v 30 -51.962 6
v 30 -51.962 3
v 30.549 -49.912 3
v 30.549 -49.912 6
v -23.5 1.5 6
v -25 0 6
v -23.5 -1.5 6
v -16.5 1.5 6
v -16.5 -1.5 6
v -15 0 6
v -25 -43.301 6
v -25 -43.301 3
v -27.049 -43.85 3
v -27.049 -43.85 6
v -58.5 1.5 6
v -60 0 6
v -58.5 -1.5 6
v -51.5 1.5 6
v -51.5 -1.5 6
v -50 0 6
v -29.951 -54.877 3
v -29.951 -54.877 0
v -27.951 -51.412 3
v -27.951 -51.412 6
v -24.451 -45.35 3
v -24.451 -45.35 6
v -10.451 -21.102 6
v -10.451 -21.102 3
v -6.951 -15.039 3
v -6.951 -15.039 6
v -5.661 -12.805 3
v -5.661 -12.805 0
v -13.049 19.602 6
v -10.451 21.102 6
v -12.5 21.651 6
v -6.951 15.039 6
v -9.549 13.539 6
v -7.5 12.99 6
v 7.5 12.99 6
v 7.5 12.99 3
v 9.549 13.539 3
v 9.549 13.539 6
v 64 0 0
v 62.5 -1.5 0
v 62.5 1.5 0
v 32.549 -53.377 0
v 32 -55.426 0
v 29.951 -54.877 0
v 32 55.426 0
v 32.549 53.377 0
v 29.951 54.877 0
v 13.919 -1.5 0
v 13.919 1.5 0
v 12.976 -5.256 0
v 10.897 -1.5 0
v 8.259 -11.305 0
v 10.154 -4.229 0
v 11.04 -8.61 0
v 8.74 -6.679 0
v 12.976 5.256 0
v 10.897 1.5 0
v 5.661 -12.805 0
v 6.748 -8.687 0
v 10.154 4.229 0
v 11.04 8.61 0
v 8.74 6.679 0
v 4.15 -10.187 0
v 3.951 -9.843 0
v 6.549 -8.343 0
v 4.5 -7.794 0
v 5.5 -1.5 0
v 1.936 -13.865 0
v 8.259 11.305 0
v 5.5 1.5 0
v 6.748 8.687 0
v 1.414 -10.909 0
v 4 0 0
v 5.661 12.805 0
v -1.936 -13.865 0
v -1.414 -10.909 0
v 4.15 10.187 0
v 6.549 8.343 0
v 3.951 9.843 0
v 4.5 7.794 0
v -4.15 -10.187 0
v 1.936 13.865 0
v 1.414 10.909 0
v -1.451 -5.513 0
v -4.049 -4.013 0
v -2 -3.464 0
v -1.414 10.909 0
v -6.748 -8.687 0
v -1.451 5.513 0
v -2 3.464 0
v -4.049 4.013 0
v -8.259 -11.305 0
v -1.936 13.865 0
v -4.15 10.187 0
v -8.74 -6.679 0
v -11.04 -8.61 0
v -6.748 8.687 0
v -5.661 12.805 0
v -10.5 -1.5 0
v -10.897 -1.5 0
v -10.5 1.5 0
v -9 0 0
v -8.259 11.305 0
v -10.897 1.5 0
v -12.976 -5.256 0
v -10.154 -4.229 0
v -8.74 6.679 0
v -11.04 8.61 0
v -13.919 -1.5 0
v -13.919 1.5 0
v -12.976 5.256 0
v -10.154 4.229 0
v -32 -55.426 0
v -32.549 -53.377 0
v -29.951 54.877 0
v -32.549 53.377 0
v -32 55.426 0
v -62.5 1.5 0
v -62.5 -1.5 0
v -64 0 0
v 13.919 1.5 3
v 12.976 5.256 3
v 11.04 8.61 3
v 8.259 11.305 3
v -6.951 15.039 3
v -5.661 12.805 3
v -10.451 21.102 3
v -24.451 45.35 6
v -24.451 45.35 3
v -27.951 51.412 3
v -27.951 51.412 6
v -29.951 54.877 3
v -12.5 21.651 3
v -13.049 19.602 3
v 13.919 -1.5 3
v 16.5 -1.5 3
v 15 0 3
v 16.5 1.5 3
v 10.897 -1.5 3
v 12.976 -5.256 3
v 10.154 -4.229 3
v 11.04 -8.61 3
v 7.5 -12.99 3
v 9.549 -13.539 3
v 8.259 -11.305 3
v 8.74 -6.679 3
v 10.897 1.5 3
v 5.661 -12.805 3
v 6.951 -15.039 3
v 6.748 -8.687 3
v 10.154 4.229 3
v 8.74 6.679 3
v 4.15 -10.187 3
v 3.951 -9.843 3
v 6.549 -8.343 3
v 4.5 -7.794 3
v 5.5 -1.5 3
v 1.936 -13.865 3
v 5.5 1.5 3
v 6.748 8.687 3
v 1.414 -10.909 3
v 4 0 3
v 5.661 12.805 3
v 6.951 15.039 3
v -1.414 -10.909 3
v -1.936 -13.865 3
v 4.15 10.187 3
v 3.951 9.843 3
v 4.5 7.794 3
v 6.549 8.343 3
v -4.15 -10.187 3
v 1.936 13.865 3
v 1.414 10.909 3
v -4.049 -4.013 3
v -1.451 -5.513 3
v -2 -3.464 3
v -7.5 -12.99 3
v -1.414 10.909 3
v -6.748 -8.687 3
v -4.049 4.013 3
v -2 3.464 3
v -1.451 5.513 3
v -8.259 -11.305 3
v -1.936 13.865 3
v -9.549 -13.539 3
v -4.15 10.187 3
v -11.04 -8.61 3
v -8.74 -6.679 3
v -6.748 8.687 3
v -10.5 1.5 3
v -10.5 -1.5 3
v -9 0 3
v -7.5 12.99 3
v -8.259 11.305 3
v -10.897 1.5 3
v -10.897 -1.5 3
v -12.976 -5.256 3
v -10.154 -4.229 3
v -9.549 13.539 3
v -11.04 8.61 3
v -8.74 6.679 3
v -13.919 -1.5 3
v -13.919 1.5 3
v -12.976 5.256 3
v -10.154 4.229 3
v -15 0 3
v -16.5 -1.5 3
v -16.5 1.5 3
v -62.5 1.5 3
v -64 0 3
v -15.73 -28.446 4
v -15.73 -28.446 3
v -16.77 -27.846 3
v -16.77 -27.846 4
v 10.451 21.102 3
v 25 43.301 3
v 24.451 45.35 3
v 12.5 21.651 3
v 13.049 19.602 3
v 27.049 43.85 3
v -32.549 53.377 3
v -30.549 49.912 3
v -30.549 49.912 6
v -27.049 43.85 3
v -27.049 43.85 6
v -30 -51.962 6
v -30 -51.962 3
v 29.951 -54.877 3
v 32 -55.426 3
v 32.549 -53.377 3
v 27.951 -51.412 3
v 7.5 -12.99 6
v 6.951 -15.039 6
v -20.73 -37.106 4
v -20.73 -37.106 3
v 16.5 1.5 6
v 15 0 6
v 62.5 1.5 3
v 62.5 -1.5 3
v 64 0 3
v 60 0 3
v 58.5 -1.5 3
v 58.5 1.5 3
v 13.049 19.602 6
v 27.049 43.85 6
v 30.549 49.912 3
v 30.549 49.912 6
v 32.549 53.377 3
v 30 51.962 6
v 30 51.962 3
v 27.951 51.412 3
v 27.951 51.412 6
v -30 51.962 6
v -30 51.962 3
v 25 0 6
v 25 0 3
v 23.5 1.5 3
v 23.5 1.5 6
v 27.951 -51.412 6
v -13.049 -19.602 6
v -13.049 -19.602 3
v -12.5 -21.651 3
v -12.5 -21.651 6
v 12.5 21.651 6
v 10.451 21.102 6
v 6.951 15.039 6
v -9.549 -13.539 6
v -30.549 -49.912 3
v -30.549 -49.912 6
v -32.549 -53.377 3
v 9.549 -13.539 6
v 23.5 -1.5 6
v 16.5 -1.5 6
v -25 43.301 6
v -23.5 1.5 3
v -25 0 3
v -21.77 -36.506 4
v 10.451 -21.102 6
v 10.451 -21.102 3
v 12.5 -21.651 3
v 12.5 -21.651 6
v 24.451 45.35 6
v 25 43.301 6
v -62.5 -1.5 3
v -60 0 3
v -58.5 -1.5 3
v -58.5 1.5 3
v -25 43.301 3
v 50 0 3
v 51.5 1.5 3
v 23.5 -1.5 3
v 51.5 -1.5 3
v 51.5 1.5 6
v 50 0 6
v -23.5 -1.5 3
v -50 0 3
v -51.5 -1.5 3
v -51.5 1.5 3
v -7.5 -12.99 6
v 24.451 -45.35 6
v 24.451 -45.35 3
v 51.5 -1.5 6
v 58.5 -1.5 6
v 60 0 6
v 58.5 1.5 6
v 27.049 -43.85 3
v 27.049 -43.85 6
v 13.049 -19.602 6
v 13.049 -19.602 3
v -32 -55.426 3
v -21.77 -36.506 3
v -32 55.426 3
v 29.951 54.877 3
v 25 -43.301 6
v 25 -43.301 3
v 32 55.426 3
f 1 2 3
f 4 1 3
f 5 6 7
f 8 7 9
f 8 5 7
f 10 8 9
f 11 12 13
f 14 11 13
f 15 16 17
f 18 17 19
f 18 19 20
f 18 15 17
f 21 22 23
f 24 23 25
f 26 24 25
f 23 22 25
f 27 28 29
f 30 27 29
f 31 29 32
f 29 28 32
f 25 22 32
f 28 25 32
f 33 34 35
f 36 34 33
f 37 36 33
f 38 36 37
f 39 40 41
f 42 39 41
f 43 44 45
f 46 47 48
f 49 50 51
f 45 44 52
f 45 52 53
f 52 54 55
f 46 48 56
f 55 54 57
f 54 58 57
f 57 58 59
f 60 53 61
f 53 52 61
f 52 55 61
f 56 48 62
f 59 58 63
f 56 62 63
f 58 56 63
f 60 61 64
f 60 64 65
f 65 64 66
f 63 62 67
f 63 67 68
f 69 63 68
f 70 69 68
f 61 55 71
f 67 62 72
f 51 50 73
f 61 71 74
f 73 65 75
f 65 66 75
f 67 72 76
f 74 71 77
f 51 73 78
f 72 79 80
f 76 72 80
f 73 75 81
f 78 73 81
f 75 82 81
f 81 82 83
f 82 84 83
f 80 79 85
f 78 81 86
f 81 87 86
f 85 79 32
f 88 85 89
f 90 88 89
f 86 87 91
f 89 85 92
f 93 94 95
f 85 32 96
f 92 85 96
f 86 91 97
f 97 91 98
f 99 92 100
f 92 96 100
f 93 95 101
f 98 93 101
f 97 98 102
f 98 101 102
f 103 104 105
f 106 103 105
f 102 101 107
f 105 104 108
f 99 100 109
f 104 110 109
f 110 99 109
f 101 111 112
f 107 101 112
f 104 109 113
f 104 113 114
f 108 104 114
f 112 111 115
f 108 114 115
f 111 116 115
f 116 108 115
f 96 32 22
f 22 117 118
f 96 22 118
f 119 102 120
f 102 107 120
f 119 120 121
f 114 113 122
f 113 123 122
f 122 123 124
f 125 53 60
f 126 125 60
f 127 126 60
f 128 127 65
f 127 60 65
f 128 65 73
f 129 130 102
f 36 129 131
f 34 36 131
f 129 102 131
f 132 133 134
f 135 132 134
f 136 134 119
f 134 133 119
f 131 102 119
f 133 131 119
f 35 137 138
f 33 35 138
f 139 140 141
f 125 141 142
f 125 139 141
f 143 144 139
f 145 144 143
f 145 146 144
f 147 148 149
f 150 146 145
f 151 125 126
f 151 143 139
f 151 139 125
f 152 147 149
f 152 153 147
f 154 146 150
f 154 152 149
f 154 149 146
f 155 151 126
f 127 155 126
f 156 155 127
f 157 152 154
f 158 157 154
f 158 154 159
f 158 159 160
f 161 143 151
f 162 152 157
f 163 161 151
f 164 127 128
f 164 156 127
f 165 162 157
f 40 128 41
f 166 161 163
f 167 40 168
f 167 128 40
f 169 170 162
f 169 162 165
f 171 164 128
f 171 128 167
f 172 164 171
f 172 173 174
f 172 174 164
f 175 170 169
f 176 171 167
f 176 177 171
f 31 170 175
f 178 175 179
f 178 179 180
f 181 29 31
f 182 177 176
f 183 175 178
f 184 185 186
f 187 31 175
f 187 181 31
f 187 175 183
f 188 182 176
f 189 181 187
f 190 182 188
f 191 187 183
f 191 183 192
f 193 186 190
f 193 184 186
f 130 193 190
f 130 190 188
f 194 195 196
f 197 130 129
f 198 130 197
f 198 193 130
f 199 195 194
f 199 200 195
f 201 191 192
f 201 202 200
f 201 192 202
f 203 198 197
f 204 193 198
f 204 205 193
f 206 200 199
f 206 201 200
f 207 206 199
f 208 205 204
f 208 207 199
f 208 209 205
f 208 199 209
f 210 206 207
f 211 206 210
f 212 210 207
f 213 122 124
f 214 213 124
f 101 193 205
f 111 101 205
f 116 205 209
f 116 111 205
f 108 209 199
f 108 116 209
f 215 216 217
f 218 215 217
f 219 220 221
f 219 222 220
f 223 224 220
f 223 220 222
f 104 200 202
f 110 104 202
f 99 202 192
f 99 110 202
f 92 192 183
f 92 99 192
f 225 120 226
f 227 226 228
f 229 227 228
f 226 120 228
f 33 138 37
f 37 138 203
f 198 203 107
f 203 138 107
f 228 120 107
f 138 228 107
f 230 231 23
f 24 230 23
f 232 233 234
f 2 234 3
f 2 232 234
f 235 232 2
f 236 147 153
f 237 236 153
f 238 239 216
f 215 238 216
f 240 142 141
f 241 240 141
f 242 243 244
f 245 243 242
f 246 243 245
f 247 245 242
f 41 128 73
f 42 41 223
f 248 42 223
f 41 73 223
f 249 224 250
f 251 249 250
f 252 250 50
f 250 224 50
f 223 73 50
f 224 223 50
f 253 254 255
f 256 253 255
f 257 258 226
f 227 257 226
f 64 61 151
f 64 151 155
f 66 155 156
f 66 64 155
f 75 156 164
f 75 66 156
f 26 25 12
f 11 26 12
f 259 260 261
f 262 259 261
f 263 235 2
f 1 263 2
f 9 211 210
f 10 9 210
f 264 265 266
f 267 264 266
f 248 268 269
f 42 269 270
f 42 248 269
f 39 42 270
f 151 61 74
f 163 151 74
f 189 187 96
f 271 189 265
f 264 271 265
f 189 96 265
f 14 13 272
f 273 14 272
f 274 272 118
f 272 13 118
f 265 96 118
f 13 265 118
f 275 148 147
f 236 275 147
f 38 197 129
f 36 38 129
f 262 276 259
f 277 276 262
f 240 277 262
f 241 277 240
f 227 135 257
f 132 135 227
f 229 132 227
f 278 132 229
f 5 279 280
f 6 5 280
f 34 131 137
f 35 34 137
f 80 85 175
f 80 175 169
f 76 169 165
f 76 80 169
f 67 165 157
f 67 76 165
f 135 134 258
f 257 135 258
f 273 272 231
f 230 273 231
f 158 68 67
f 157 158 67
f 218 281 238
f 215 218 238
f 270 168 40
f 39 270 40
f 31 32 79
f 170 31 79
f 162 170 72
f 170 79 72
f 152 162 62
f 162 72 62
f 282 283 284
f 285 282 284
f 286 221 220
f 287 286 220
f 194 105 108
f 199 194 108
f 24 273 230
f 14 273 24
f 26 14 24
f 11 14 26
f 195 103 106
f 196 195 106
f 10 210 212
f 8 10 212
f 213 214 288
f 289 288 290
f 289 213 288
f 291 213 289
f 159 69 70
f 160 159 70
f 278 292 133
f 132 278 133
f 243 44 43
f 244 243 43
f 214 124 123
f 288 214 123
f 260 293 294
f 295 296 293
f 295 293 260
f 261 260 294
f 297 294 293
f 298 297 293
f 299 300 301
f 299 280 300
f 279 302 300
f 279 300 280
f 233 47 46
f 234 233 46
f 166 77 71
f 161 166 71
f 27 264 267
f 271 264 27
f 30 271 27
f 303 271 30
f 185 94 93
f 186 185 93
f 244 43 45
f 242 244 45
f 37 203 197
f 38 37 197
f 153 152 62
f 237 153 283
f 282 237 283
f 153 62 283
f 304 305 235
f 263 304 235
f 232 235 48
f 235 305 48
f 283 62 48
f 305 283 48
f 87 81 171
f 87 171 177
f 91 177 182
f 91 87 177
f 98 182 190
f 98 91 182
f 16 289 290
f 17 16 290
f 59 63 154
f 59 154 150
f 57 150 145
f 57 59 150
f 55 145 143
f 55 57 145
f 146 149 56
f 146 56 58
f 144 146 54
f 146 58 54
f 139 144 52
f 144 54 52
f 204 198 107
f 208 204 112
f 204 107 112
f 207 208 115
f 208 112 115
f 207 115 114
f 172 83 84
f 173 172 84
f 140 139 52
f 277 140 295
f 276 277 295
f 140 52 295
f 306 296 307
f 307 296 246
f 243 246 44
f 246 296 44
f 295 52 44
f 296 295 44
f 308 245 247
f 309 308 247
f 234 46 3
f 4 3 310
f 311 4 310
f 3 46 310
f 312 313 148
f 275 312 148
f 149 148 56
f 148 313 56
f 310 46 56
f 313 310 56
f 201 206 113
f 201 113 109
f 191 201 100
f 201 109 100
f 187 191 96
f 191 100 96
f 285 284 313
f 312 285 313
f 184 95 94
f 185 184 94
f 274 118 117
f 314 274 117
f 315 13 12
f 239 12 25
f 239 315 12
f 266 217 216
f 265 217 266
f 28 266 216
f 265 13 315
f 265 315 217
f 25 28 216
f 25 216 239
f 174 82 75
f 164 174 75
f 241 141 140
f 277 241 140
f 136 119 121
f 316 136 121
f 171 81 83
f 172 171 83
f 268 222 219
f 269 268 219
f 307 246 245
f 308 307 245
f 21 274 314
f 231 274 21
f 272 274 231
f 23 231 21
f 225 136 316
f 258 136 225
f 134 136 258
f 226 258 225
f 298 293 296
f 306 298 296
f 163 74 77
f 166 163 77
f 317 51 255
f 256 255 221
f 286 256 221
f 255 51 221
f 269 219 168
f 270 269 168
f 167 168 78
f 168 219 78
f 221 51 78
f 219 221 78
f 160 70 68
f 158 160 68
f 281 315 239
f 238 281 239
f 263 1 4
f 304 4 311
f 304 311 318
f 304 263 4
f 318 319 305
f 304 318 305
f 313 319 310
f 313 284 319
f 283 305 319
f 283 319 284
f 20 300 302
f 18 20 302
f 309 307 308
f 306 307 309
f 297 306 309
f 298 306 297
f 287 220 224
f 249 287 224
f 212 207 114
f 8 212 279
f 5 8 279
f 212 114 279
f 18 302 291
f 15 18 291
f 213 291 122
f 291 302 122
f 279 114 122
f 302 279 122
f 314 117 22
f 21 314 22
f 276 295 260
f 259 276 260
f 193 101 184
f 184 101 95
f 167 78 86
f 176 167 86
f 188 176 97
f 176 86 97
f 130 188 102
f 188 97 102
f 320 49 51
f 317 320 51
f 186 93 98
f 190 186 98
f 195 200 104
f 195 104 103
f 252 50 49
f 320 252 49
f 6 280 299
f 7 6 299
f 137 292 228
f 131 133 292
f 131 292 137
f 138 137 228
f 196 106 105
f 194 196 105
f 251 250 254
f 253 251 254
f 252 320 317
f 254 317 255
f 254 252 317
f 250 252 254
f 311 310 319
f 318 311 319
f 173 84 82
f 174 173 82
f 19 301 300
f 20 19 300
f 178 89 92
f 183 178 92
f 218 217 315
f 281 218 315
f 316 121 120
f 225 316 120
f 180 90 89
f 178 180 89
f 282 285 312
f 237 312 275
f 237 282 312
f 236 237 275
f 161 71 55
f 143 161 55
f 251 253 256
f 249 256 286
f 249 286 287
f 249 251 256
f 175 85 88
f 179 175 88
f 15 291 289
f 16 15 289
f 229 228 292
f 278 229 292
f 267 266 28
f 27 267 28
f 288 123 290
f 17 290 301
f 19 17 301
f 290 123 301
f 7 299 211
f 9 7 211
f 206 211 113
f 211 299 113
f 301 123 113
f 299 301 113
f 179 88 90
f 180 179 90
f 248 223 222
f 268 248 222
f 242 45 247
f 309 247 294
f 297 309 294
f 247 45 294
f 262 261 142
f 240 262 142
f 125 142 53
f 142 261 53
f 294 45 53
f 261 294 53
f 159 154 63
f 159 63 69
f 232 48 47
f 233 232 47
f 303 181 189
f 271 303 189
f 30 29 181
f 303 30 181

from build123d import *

# Parameters (mm, degrees)
F1_DEPTH = 3
F4_DEPTH = 3
F5_COUNT = 3
F5_ANGLE = 240
F7_DEPTH = 1
F8_R     = 14
F8_R_2   = 11
F9_DEPTH = 3


# Not quite as in the source:
# - a feature names something its author has since deleted; it is built from what else it names


with BuildPart() as f1:
    # F0 (on Top) → F1 (new body)
    with BuildSketch(Plane.XY):
        Polygon((-2, -3.4641016151), (-4.0490381057, -4.0131397208), (-32.5490381057, -53.3765877365), (-32, -55.4256258422), (-29.9509618943, -54.8765877365), (-1.4509618943, -5.5131397208), align=None)
    extrude(amount=F1_DEPTH)

    # F3 (on face) → F4, piece 2 (join)
    with BuildSketch(Plane.XY.offset(3)):
        Polygon((-27.0490381057, -43.8503082949), (-30.5490381057, -49.9124861214), (-30, -51.9615242271), (-27.9509618943, -51.4124861214), (-24.4509618943, -45.3503082949), (-25, -43.3012701892), align=None)
        Polygon((-9.5490381057, -13.5394191624), (-13.0490381057, -19.6015969889), (-12.5, -21.6506350946), (-10.4509618943, -21.1015969889), (-6.9509618943, -15.0394191624), (-7.5, -12.9903810568), align=None)
    extrude(amount=F4_DEPTH)


with BuildPart() as f1b:
    # F0 (on Top) → F1, piece 2 (new body)
    with BuildSketch(Plane.XY):
        Polygon((-10.5, 1.5), (-62.5, 1.5), (-64, 0), (-62.5, -1.5), (-10.5, -1.5), (-9, 0), align=None)
    extrude(amount=F1_DEPTH)

    # F3 (on face) → F4 (join)
    with BuildSketch(Plane.XY.offset(3)):
        Polygon((-51.5, 1.5), (-58.5, 1.5), (-60, 0), (-58.5, -1.5), (-51.5, -1.5), (-50, 0), align=None)
        Polygon((-16.5, 1.5), (-23.5, 1.5), (-25, 0), (-23.5, -1.5), (-16.5, -1.5), (-15, 0), align=None)
    extrude(amount=F4_DEPTH)


with BuildPart() as f5_1:
    # F5: instance of F1
    add(f1.part.rotate(Axis((0, 0, 0.1916177571), (0, 0, -1)), 1 * F5_ANGLE / (F5_COUNT - 1)))


with BuildPart() as f5_2:
    # F5: instance of F1
    add(f1.part.rotate(Axis((0, 0, 0.1916177571), (0, 0, -1)), 2 * F5_ANGLE / (F5_COUNT - 1)))


with BuildPart() as f5_3:
    # F5: instance of F1b
    add(f1b.part.rotate(Axis((0, 0, 0.1916177571), (0, 0, -1)), 1 * F5_ANGLE / (F5_COUNT - 1)))


with BuildPart() as f5_4:
    # F5: instance of F1b
    add(f1b.part.rotate(Axis((0, 0, 0.1916177571), (0, 0, -1)), 2 * F5_ANGLE / (F5_COUNT - 1)))


with BuildPart() as f1_1:
    add(f1.part)

    # F6 (on face) → F7 (join)
    with BuildSketch(Plane.XY.offset(3)):
        Polygon((-15.7303847577, -28.445825623), (-16.7696152423, -27.845825623), (-21.7696152423, -36.5060796608), (-20.7303847577, -37.1060796608), align=None)
    extrude(amount=F7_DEPTH)

    add(f1b.part)  # F9 merges F1b

    add(f5_1.part)  # F9 merges F5_1

    add(f5_2.part)  # F9 merges F5_2

    add(f5_3.part)  # F9 merges F5_3

    add(f5_4.part)  # F9 merges F5_4
    # F8 (on Top) → F9 (join)
    with BuildSketch(Plane.XY):
        Circle(F8_R)
        Circle(F8_R_2, mode=Mode.SUBTRACT)
    extrude(amount=F9_DEPTH)


solid = f1_1.part
